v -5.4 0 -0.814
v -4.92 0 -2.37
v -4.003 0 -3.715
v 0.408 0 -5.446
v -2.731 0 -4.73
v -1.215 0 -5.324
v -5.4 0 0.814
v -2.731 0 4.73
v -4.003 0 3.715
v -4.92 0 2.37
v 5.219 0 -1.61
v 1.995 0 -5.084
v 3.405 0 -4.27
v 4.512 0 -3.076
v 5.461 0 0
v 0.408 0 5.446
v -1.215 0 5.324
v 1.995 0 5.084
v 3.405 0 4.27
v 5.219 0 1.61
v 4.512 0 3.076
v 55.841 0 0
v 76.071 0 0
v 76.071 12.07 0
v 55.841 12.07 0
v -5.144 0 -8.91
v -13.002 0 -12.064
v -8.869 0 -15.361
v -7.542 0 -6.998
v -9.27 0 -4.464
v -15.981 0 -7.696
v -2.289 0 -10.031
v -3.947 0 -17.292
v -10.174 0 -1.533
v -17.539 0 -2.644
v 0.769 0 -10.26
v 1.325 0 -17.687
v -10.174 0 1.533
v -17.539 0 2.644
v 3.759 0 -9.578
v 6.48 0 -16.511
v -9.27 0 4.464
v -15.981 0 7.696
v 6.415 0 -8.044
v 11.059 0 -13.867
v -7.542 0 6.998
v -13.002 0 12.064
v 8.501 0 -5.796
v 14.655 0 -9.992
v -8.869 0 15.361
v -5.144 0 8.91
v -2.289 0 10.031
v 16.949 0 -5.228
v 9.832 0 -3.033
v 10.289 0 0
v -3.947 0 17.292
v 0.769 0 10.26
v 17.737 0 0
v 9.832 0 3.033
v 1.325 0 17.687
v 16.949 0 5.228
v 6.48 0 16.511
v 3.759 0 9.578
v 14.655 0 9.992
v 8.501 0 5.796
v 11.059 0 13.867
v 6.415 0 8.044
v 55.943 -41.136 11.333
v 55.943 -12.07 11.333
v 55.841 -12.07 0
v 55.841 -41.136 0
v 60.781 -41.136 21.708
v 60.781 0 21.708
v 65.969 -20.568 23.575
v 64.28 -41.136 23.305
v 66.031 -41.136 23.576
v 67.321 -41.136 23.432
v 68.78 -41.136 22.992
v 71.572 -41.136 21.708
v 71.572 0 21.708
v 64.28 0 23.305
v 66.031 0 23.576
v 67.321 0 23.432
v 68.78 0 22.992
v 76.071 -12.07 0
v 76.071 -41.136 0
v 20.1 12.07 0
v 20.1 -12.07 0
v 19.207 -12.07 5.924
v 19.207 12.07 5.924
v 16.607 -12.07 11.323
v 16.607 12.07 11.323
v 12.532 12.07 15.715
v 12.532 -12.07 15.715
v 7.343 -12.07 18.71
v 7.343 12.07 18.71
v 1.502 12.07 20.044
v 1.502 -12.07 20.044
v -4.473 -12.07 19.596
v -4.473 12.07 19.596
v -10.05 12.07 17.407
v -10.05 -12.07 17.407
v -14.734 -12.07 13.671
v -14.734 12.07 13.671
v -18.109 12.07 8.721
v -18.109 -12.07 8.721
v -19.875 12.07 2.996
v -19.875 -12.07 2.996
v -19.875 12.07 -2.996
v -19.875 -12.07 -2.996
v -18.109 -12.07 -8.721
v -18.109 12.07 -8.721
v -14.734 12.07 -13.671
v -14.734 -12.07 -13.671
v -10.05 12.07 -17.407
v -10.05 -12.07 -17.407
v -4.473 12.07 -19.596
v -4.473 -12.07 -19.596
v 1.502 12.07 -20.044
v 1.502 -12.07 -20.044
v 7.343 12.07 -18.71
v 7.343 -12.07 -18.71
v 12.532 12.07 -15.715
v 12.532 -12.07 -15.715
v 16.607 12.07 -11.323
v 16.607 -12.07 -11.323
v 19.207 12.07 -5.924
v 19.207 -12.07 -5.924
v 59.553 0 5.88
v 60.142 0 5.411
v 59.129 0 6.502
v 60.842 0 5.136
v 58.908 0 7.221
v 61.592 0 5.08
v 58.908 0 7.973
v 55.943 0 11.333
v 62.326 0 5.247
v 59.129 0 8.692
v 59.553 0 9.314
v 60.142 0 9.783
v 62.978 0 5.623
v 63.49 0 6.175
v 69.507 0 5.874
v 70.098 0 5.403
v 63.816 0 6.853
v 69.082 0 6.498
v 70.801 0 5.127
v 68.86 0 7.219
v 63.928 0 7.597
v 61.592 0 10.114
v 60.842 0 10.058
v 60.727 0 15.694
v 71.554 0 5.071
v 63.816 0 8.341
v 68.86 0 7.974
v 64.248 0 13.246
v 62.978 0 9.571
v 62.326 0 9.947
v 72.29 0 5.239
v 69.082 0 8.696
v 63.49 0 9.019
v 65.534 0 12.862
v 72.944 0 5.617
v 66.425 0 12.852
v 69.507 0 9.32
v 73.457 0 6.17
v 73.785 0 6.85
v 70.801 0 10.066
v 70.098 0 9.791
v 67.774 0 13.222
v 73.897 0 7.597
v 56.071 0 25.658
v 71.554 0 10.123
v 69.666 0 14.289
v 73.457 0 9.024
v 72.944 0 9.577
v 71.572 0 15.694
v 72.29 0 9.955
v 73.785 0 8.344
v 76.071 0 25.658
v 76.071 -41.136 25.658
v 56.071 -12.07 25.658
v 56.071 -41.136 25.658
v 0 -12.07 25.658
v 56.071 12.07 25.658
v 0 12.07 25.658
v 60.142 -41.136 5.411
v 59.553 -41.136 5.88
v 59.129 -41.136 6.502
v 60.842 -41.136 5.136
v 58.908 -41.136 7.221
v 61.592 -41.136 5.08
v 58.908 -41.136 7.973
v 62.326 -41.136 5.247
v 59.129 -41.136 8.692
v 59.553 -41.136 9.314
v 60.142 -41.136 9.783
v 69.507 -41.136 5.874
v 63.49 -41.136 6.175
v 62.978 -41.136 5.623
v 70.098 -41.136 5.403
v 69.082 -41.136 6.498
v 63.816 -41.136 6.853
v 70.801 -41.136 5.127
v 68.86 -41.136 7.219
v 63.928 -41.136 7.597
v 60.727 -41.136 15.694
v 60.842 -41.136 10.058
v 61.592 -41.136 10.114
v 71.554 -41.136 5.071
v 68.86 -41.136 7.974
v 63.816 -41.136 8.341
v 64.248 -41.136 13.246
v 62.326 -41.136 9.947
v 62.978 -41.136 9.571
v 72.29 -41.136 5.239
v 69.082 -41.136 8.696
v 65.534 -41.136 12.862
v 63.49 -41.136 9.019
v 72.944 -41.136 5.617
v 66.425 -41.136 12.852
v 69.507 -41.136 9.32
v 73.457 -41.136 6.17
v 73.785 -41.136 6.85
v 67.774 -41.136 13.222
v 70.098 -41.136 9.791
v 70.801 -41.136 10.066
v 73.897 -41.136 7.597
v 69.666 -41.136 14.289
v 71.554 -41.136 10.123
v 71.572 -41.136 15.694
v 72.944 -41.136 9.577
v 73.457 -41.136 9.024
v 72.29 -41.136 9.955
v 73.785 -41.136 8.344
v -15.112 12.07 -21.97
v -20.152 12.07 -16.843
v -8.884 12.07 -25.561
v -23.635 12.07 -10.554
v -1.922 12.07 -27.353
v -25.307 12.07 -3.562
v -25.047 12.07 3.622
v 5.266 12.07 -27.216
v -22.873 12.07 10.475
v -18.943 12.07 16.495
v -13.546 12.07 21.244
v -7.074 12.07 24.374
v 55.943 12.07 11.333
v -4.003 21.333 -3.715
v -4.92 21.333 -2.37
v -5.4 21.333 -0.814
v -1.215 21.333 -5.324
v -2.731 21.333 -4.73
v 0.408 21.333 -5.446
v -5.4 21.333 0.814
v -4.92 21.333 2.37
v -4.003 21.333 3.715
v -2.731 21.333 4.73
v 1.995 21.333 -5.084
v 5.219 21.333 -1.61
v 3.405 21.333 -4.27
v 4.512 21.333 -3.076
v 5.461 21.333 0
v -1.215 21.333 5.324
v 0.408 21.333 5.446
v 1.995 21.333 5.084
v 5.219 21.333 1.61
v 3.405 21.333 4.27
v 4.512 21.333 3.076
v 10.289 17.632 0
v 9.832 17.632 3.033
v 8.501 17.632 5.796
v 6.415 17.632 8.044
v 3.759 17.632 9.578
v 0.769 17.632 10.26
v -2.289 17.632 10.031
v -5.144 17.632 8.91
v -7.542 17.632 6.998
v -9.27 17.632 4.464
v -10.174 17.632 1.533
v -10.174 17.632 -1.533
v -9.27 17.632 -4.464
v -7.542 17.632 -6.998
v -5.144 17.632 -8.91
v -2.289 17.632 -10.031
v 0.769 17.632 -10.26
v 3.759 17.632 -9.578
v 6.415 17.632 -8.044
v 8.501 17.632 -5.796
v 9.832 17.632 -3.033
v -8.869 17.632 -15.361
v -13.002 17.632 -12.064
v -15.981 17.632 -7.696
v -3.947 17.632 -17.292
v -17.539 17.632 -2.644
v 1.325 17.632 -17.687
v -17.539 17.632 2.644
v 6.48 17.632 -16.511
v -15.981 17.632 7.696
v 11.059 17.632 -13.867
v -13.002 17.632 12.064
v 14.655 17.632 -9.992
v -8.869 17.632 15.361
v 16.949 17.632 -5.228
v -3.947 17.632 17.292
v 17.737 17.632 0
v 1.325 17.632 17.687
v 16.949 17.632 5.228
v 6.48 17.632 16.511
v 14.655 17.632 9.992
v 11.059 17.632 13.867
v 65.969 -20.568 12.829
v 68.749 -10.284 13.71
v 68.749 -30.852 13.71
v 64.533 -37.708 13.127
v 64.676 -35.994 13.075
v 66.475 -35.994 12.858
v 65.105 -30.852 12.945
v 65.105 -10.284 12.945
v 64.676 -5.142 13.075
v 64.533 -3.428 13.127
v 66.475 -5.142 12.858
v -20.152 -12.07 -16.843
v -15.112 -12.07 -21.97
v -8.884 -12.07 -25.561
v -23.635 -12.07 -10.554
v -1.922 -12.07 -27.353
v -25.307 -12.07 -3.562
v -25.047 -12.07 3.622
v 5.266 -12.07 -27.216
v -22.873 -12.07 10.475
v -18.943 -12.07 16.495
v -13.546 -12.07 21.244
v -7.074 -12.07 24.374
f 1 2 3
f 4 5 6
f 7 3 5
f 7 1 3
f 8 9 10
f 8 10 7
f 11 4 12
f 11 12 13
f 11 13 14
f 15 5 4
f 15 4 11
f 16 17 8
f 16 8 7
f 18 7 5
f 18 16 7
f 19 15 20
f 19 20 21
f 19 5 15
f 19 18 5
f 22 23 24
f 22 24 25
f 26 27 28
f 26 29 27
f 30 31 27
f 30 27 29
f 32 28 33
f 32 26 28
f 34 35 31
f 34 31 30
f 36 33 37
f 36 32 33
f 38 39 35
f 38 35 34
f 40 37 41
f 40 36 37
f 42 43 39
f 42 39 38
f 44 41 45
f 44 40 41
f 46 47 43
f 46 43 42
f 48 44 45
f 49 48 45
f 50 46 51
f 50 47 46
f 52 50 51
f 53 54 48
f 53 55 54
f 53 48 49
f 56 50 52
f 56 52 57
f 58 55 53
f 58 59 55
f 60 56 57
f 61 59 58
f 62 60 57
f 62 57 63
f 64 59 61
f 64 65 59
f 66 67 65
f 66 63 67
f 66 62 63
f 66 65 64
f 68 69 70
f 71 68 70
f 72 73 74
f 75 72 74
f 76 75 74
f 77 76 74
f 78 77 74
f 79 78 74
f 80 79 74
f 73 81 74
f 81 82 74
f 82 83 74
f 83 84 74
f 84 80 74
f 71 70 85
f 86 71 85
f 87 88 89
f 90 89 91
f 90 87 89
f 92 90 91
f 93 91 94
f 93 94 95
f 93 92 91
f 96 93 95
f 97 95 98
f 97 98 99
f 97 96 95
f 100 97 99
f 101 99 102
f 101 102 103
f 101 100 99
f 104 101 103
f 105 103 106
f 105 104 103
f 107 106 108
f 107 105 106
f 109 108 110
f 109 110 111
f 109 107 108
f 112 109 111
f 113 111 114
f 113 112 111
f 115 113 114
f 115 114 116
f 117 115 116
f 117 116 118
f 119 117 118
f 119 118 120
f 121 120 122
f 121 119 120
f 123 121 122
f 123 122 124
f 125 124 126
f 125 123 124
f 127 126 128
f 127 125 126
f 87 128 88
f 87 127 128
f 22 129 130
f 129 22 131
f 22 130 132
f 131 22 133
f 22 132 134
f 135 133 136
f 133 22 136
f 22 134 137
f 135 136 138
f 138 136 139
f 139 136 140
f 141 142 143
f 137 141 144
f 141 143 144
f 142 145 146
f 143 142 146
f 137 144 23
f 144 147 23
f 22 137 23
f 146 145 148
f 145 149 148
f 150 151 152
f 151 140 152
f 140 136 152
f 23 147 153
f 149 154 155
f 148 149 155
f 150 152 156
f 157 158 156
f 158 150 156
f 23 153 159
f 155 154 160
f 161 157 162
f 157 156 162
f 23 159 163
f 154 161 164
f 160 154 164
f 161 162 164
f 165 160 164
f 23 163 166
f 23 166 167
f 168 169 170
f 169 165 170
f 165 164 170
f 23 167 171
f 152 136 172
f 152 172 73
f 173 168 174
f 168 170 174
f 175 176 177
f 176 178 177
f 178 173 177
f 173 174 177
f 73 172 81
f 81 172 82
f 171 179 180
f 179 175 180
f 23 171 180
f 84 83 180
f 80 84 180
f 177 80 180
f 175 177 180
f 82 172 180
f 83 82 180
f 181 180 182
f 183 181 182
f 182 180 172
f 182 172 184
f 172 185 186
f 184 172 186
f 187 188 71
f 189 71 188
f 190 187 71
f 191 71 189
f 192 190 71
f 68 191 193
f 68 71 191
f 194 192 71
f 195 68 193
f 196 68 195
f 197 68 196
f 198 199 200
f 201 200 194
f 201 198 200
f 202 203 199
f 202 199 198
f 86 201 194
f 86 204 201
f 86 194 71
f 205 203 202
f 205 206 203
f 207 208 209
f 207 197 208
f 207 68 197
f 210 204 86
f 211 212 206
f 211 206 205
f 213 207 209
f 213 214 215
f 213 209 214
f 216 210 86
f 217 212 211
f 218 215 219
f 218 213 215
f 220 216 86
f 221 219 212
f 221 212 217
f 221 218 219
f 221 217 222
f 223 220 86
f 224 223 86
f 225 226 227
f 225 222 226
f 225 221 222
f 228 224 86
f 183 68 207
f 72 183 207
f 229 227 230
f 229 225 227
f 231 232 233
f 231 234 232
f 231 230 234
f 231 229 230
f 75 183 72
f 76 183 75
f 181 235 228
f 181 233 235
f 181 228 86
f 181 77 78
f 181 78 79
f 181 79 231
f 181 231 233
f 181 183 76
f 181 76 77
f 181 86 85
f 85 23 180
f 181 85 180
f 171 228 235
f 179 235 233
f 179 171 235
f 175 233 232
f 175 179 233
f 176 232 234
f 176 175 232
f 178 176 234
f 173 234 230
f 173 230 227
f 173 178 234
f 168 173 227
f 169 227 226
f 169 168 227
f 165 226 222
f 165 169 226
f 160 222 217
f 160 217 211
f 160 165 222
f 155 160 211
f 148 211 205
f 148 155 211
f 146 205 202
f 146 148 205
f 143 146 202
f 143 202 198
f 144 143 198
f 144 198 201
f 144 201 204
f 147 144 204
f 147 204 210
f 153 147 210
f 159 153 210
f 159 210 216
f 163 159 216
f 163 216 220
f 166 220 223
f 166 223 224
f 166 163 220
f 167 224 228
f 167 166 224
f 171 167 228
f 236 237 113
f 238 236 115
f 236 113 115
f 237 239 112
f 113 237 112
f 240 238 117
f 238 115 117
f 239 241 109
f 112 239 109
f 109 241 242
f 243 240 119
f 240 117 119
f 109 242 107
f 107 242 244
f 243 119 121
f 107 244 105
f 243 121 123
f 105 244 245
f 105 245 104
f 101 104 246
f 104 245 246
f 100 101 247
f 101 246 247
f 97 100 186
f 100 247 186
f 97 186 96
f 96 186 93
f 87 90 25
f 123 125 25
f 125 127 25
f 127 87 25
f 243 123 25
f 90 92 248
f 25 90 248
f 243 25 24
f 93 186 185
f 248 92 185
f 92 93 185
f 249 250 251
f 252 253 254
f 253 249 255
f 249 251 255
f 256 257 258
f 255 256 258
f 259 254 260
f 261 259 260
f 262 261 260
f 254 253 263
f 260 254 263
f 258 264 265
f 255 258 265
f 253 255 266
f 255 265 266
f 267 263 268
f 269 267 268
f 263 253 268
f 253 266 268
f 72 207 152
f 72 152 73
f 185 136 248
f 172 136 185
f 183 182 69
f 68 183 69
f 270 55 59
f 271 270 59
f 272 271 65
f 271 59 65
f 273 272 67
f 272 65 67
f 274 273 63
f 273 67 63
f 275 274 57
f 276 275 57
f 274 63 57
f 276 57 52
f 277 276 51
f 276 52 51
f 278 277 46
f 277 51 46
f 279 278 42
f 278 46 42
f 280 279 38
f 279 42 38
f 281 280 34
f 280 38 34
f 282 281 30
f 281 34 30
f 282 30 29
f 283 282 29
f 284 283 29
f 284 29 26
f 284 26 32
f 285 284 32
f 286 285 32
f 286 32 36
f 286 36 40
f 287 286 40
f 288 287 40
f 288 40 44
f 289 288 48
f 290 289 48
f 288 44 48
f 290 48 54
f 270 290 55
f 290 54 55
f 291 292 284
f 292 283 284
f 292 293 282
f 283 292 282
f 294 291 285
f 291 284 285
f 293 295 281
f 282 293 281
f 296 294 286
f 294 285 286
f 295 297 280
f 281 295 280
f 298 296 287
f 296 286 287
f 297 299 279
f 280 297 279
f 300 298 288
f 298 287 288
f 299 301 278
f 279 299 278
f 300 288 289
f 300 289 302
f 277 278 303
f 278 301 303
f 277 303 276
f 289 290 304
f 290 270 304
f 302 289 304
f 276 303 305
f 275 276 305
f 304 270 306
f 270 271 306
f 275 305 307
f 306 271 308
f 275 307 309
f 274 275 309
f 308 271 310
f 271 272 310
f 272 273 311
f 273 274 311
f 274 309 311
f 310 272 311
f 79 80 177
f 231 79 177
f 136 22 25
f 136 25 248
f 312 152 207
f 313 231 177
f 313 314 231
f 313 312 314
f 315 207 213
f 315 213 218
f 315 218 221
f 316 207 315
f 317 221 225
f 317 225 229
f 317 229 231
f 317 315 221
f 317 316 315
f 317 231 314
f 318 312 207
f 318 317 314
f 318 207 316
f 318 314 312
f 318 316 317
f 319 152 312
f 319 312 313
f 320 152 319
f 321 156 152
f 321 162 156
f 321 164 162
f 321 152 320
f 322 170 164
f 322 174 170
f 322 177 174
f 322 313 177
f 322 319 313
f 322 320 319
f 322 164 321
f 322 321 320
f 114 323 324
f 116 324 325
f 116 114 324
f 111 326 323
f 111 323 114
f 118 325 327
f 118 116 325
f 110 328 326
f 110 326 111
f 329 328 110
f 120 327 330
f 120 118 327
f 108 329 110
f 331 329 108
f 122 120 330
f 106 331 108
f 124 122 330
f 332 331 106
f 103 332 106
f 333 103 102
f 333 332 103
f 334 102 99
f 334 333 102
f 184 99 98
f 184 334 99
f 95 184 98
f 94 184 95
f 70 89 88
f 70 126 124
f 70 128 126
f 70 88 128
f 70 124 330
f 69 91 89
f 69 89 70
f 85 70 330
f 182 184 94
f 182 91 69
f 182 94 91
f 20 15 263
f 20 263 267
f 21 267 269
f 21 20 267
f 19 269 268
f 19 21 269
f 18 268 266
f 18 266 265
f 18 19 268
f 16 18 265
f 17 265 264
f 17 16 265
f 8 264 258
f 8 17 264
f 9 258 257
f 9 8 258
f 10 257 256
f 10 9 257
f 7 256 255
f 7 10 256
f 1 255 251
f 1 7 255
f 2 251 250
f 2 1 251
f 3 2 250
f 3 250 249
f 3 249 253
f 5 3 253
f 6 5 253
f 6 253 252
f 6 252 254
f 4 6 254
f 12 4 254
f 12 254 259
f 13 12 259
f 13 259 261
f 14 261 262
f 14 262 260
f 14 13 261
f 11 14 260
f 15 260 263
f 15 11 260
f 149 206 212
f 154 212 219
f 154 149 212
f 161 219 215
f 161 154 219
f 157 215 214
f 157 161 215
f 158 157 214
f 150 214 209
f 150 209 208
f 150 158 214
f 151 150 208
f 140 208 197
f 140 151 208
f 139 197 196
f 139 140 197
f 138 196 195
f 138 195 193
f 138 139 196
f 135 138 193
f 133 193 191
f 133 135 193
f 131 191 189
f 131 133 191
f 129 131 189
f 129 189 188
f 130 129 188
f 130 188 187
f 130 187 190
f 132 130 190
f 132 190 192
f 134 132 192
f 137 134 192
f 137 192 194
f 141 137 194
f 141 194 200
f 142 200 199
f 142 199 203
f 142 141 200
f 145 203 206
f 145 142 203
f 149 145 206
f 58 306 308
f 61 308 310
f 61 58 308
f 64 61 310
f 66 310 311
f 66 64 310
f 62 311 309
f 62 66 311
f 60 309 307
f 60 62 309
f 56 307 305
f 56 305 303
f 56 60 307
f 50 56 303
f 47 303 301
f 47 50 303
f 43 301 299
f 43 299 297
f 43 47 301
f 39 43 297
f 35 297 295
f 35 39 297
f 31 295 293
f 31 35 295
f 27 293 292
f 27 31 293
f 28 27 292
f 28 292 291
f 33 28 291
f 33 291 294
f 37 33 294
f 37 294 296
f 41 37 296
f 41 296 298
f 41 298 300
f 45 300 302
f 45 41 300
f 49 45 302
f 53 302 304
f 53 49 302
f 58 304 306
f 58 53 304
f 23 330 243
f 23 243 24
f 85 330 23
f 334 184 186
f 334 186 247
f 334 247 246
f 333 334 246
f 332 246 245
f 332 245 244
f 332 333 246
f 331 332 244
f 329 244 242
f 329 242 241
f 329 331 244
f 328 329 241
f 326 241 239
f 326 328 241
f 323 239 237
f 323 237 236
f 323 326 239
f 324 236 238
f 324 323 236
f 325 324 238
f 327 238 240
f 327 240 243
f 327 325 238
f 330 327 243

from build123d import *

# Parameters (mm, degrees)
F0_R     = 5.4613233485
F1_DEPTH = 21.3326
F0_R_2   = 17.7370944441
F0_R_3   = 10.288784277
F2_DEPTH = 17.63161
F0_R_4   = 20.0997074459
F3_DEPTH = 12.06991
F0_R_5   = 2.5244614793
F0_R_6   = 2.5329756631
F4_DEPTH = 41.13553


with BuildPart() as f1:
    # F0 (on Front) → F1 (new body)
    with BuildSketch(Plane.XZ):
        Circle(F0_R)
    extrude(amount=-F1_DEPTH)


with BuildPart() as f2:
    # F0 (on Front) → F2 (new body)
    with BuildSketch(Plane.XZ):
        Circle(F0_R_2)
        Circle(F0_R_3, mode=Mode.SUBTRACT)
    extrude(amount=-F2_DEPTH)


with BuildPart() as f3:
    # F0 (on Front) → F3 (new body, symmetric)
    with BuildSketch(Plane.XZ):
        with BuildLine():
            Line((56.0708636168, 25.6575048998), (0, 25.6575048998))
            ThreePointArc((0, 25.6575048998), (-25.3072053767, -3.5621654459), (5.2662704281, -27.2160521519))
            Line((5.2662704281, -27.2160521519), (76.0708636168, 0))
            Line((76.0708636168, 0), (55.8409741003, 0))
            Line((55.8409741003, 0), (55.9425145146, 11.3327206796))
            Line((55.9425145146, 11.3327206796), (56.0708636168, 25.6575048998))
        make_face()
        Circle(F0_R_4, mode=Mode.SUBTRACT)
    extrude(amount=F3_DEPTH, both=True)

    # F0 (on Front) → F4 (join)
    with BuildSketch(Plane.XZ):
        Polygon((76.0708636168, 25.6575048998), (56.0708636168, 25.6575048998), (55.9425145146, 11.3327206796), (76.0708636168, 11.1523720268), align=None)
        with BuildLine():
            Line((60.7273741383, 15.6940306851), (60.7812553644, 21.7076055706))
            add(Edge.make_bspline(
                [(60.7812553644, 21.7076055706), (62.4920059957, 22.6308860077), (65.9733020744, 24.5097177361), (69.6843552677, 22.6522774372), (71.571752429, 21.7076055706)],
                knots=[0, 0, 0, 0, 0.4914119893, 1, 1, 1, 1], degree=3))
            Line((71.571752429, 21.7076055706), (71.571752429, 15.6940306851))
            add(Edge.make_bspline(
                [(60.7273741383, 15.6940306851), (62.4567179182, 14.2736635588), (65.9610183309, 11.3954659647), (69.6853487899, 14.2487958923), (71.571752429, 15.6940306851)],
                knots=[0, 0, 0, 0, 0.4934918746, 1, 1, 1, 1], degree=3))
        make_face(mode=Mode.SUBTRACT)
        Polygon((55.8409741003, 0), (76.0708636168, 0), (76.0708636168, 11.1523720268), (55.9425145146, 11.3327206796), align=None)
        with Locations((61.4037886262, 7.596957963)):
            Circle(F0_R_5, mode=Mode.SUBTRACT)
        with Locations((71.3642463088, 7.596957963)):
            Circle(F0_R_6, mode=Mode.SUBTRACT)
    extrude(amount=F4_DEPTH)


solid = Compound([f1.part, f2.part, f3.part])
